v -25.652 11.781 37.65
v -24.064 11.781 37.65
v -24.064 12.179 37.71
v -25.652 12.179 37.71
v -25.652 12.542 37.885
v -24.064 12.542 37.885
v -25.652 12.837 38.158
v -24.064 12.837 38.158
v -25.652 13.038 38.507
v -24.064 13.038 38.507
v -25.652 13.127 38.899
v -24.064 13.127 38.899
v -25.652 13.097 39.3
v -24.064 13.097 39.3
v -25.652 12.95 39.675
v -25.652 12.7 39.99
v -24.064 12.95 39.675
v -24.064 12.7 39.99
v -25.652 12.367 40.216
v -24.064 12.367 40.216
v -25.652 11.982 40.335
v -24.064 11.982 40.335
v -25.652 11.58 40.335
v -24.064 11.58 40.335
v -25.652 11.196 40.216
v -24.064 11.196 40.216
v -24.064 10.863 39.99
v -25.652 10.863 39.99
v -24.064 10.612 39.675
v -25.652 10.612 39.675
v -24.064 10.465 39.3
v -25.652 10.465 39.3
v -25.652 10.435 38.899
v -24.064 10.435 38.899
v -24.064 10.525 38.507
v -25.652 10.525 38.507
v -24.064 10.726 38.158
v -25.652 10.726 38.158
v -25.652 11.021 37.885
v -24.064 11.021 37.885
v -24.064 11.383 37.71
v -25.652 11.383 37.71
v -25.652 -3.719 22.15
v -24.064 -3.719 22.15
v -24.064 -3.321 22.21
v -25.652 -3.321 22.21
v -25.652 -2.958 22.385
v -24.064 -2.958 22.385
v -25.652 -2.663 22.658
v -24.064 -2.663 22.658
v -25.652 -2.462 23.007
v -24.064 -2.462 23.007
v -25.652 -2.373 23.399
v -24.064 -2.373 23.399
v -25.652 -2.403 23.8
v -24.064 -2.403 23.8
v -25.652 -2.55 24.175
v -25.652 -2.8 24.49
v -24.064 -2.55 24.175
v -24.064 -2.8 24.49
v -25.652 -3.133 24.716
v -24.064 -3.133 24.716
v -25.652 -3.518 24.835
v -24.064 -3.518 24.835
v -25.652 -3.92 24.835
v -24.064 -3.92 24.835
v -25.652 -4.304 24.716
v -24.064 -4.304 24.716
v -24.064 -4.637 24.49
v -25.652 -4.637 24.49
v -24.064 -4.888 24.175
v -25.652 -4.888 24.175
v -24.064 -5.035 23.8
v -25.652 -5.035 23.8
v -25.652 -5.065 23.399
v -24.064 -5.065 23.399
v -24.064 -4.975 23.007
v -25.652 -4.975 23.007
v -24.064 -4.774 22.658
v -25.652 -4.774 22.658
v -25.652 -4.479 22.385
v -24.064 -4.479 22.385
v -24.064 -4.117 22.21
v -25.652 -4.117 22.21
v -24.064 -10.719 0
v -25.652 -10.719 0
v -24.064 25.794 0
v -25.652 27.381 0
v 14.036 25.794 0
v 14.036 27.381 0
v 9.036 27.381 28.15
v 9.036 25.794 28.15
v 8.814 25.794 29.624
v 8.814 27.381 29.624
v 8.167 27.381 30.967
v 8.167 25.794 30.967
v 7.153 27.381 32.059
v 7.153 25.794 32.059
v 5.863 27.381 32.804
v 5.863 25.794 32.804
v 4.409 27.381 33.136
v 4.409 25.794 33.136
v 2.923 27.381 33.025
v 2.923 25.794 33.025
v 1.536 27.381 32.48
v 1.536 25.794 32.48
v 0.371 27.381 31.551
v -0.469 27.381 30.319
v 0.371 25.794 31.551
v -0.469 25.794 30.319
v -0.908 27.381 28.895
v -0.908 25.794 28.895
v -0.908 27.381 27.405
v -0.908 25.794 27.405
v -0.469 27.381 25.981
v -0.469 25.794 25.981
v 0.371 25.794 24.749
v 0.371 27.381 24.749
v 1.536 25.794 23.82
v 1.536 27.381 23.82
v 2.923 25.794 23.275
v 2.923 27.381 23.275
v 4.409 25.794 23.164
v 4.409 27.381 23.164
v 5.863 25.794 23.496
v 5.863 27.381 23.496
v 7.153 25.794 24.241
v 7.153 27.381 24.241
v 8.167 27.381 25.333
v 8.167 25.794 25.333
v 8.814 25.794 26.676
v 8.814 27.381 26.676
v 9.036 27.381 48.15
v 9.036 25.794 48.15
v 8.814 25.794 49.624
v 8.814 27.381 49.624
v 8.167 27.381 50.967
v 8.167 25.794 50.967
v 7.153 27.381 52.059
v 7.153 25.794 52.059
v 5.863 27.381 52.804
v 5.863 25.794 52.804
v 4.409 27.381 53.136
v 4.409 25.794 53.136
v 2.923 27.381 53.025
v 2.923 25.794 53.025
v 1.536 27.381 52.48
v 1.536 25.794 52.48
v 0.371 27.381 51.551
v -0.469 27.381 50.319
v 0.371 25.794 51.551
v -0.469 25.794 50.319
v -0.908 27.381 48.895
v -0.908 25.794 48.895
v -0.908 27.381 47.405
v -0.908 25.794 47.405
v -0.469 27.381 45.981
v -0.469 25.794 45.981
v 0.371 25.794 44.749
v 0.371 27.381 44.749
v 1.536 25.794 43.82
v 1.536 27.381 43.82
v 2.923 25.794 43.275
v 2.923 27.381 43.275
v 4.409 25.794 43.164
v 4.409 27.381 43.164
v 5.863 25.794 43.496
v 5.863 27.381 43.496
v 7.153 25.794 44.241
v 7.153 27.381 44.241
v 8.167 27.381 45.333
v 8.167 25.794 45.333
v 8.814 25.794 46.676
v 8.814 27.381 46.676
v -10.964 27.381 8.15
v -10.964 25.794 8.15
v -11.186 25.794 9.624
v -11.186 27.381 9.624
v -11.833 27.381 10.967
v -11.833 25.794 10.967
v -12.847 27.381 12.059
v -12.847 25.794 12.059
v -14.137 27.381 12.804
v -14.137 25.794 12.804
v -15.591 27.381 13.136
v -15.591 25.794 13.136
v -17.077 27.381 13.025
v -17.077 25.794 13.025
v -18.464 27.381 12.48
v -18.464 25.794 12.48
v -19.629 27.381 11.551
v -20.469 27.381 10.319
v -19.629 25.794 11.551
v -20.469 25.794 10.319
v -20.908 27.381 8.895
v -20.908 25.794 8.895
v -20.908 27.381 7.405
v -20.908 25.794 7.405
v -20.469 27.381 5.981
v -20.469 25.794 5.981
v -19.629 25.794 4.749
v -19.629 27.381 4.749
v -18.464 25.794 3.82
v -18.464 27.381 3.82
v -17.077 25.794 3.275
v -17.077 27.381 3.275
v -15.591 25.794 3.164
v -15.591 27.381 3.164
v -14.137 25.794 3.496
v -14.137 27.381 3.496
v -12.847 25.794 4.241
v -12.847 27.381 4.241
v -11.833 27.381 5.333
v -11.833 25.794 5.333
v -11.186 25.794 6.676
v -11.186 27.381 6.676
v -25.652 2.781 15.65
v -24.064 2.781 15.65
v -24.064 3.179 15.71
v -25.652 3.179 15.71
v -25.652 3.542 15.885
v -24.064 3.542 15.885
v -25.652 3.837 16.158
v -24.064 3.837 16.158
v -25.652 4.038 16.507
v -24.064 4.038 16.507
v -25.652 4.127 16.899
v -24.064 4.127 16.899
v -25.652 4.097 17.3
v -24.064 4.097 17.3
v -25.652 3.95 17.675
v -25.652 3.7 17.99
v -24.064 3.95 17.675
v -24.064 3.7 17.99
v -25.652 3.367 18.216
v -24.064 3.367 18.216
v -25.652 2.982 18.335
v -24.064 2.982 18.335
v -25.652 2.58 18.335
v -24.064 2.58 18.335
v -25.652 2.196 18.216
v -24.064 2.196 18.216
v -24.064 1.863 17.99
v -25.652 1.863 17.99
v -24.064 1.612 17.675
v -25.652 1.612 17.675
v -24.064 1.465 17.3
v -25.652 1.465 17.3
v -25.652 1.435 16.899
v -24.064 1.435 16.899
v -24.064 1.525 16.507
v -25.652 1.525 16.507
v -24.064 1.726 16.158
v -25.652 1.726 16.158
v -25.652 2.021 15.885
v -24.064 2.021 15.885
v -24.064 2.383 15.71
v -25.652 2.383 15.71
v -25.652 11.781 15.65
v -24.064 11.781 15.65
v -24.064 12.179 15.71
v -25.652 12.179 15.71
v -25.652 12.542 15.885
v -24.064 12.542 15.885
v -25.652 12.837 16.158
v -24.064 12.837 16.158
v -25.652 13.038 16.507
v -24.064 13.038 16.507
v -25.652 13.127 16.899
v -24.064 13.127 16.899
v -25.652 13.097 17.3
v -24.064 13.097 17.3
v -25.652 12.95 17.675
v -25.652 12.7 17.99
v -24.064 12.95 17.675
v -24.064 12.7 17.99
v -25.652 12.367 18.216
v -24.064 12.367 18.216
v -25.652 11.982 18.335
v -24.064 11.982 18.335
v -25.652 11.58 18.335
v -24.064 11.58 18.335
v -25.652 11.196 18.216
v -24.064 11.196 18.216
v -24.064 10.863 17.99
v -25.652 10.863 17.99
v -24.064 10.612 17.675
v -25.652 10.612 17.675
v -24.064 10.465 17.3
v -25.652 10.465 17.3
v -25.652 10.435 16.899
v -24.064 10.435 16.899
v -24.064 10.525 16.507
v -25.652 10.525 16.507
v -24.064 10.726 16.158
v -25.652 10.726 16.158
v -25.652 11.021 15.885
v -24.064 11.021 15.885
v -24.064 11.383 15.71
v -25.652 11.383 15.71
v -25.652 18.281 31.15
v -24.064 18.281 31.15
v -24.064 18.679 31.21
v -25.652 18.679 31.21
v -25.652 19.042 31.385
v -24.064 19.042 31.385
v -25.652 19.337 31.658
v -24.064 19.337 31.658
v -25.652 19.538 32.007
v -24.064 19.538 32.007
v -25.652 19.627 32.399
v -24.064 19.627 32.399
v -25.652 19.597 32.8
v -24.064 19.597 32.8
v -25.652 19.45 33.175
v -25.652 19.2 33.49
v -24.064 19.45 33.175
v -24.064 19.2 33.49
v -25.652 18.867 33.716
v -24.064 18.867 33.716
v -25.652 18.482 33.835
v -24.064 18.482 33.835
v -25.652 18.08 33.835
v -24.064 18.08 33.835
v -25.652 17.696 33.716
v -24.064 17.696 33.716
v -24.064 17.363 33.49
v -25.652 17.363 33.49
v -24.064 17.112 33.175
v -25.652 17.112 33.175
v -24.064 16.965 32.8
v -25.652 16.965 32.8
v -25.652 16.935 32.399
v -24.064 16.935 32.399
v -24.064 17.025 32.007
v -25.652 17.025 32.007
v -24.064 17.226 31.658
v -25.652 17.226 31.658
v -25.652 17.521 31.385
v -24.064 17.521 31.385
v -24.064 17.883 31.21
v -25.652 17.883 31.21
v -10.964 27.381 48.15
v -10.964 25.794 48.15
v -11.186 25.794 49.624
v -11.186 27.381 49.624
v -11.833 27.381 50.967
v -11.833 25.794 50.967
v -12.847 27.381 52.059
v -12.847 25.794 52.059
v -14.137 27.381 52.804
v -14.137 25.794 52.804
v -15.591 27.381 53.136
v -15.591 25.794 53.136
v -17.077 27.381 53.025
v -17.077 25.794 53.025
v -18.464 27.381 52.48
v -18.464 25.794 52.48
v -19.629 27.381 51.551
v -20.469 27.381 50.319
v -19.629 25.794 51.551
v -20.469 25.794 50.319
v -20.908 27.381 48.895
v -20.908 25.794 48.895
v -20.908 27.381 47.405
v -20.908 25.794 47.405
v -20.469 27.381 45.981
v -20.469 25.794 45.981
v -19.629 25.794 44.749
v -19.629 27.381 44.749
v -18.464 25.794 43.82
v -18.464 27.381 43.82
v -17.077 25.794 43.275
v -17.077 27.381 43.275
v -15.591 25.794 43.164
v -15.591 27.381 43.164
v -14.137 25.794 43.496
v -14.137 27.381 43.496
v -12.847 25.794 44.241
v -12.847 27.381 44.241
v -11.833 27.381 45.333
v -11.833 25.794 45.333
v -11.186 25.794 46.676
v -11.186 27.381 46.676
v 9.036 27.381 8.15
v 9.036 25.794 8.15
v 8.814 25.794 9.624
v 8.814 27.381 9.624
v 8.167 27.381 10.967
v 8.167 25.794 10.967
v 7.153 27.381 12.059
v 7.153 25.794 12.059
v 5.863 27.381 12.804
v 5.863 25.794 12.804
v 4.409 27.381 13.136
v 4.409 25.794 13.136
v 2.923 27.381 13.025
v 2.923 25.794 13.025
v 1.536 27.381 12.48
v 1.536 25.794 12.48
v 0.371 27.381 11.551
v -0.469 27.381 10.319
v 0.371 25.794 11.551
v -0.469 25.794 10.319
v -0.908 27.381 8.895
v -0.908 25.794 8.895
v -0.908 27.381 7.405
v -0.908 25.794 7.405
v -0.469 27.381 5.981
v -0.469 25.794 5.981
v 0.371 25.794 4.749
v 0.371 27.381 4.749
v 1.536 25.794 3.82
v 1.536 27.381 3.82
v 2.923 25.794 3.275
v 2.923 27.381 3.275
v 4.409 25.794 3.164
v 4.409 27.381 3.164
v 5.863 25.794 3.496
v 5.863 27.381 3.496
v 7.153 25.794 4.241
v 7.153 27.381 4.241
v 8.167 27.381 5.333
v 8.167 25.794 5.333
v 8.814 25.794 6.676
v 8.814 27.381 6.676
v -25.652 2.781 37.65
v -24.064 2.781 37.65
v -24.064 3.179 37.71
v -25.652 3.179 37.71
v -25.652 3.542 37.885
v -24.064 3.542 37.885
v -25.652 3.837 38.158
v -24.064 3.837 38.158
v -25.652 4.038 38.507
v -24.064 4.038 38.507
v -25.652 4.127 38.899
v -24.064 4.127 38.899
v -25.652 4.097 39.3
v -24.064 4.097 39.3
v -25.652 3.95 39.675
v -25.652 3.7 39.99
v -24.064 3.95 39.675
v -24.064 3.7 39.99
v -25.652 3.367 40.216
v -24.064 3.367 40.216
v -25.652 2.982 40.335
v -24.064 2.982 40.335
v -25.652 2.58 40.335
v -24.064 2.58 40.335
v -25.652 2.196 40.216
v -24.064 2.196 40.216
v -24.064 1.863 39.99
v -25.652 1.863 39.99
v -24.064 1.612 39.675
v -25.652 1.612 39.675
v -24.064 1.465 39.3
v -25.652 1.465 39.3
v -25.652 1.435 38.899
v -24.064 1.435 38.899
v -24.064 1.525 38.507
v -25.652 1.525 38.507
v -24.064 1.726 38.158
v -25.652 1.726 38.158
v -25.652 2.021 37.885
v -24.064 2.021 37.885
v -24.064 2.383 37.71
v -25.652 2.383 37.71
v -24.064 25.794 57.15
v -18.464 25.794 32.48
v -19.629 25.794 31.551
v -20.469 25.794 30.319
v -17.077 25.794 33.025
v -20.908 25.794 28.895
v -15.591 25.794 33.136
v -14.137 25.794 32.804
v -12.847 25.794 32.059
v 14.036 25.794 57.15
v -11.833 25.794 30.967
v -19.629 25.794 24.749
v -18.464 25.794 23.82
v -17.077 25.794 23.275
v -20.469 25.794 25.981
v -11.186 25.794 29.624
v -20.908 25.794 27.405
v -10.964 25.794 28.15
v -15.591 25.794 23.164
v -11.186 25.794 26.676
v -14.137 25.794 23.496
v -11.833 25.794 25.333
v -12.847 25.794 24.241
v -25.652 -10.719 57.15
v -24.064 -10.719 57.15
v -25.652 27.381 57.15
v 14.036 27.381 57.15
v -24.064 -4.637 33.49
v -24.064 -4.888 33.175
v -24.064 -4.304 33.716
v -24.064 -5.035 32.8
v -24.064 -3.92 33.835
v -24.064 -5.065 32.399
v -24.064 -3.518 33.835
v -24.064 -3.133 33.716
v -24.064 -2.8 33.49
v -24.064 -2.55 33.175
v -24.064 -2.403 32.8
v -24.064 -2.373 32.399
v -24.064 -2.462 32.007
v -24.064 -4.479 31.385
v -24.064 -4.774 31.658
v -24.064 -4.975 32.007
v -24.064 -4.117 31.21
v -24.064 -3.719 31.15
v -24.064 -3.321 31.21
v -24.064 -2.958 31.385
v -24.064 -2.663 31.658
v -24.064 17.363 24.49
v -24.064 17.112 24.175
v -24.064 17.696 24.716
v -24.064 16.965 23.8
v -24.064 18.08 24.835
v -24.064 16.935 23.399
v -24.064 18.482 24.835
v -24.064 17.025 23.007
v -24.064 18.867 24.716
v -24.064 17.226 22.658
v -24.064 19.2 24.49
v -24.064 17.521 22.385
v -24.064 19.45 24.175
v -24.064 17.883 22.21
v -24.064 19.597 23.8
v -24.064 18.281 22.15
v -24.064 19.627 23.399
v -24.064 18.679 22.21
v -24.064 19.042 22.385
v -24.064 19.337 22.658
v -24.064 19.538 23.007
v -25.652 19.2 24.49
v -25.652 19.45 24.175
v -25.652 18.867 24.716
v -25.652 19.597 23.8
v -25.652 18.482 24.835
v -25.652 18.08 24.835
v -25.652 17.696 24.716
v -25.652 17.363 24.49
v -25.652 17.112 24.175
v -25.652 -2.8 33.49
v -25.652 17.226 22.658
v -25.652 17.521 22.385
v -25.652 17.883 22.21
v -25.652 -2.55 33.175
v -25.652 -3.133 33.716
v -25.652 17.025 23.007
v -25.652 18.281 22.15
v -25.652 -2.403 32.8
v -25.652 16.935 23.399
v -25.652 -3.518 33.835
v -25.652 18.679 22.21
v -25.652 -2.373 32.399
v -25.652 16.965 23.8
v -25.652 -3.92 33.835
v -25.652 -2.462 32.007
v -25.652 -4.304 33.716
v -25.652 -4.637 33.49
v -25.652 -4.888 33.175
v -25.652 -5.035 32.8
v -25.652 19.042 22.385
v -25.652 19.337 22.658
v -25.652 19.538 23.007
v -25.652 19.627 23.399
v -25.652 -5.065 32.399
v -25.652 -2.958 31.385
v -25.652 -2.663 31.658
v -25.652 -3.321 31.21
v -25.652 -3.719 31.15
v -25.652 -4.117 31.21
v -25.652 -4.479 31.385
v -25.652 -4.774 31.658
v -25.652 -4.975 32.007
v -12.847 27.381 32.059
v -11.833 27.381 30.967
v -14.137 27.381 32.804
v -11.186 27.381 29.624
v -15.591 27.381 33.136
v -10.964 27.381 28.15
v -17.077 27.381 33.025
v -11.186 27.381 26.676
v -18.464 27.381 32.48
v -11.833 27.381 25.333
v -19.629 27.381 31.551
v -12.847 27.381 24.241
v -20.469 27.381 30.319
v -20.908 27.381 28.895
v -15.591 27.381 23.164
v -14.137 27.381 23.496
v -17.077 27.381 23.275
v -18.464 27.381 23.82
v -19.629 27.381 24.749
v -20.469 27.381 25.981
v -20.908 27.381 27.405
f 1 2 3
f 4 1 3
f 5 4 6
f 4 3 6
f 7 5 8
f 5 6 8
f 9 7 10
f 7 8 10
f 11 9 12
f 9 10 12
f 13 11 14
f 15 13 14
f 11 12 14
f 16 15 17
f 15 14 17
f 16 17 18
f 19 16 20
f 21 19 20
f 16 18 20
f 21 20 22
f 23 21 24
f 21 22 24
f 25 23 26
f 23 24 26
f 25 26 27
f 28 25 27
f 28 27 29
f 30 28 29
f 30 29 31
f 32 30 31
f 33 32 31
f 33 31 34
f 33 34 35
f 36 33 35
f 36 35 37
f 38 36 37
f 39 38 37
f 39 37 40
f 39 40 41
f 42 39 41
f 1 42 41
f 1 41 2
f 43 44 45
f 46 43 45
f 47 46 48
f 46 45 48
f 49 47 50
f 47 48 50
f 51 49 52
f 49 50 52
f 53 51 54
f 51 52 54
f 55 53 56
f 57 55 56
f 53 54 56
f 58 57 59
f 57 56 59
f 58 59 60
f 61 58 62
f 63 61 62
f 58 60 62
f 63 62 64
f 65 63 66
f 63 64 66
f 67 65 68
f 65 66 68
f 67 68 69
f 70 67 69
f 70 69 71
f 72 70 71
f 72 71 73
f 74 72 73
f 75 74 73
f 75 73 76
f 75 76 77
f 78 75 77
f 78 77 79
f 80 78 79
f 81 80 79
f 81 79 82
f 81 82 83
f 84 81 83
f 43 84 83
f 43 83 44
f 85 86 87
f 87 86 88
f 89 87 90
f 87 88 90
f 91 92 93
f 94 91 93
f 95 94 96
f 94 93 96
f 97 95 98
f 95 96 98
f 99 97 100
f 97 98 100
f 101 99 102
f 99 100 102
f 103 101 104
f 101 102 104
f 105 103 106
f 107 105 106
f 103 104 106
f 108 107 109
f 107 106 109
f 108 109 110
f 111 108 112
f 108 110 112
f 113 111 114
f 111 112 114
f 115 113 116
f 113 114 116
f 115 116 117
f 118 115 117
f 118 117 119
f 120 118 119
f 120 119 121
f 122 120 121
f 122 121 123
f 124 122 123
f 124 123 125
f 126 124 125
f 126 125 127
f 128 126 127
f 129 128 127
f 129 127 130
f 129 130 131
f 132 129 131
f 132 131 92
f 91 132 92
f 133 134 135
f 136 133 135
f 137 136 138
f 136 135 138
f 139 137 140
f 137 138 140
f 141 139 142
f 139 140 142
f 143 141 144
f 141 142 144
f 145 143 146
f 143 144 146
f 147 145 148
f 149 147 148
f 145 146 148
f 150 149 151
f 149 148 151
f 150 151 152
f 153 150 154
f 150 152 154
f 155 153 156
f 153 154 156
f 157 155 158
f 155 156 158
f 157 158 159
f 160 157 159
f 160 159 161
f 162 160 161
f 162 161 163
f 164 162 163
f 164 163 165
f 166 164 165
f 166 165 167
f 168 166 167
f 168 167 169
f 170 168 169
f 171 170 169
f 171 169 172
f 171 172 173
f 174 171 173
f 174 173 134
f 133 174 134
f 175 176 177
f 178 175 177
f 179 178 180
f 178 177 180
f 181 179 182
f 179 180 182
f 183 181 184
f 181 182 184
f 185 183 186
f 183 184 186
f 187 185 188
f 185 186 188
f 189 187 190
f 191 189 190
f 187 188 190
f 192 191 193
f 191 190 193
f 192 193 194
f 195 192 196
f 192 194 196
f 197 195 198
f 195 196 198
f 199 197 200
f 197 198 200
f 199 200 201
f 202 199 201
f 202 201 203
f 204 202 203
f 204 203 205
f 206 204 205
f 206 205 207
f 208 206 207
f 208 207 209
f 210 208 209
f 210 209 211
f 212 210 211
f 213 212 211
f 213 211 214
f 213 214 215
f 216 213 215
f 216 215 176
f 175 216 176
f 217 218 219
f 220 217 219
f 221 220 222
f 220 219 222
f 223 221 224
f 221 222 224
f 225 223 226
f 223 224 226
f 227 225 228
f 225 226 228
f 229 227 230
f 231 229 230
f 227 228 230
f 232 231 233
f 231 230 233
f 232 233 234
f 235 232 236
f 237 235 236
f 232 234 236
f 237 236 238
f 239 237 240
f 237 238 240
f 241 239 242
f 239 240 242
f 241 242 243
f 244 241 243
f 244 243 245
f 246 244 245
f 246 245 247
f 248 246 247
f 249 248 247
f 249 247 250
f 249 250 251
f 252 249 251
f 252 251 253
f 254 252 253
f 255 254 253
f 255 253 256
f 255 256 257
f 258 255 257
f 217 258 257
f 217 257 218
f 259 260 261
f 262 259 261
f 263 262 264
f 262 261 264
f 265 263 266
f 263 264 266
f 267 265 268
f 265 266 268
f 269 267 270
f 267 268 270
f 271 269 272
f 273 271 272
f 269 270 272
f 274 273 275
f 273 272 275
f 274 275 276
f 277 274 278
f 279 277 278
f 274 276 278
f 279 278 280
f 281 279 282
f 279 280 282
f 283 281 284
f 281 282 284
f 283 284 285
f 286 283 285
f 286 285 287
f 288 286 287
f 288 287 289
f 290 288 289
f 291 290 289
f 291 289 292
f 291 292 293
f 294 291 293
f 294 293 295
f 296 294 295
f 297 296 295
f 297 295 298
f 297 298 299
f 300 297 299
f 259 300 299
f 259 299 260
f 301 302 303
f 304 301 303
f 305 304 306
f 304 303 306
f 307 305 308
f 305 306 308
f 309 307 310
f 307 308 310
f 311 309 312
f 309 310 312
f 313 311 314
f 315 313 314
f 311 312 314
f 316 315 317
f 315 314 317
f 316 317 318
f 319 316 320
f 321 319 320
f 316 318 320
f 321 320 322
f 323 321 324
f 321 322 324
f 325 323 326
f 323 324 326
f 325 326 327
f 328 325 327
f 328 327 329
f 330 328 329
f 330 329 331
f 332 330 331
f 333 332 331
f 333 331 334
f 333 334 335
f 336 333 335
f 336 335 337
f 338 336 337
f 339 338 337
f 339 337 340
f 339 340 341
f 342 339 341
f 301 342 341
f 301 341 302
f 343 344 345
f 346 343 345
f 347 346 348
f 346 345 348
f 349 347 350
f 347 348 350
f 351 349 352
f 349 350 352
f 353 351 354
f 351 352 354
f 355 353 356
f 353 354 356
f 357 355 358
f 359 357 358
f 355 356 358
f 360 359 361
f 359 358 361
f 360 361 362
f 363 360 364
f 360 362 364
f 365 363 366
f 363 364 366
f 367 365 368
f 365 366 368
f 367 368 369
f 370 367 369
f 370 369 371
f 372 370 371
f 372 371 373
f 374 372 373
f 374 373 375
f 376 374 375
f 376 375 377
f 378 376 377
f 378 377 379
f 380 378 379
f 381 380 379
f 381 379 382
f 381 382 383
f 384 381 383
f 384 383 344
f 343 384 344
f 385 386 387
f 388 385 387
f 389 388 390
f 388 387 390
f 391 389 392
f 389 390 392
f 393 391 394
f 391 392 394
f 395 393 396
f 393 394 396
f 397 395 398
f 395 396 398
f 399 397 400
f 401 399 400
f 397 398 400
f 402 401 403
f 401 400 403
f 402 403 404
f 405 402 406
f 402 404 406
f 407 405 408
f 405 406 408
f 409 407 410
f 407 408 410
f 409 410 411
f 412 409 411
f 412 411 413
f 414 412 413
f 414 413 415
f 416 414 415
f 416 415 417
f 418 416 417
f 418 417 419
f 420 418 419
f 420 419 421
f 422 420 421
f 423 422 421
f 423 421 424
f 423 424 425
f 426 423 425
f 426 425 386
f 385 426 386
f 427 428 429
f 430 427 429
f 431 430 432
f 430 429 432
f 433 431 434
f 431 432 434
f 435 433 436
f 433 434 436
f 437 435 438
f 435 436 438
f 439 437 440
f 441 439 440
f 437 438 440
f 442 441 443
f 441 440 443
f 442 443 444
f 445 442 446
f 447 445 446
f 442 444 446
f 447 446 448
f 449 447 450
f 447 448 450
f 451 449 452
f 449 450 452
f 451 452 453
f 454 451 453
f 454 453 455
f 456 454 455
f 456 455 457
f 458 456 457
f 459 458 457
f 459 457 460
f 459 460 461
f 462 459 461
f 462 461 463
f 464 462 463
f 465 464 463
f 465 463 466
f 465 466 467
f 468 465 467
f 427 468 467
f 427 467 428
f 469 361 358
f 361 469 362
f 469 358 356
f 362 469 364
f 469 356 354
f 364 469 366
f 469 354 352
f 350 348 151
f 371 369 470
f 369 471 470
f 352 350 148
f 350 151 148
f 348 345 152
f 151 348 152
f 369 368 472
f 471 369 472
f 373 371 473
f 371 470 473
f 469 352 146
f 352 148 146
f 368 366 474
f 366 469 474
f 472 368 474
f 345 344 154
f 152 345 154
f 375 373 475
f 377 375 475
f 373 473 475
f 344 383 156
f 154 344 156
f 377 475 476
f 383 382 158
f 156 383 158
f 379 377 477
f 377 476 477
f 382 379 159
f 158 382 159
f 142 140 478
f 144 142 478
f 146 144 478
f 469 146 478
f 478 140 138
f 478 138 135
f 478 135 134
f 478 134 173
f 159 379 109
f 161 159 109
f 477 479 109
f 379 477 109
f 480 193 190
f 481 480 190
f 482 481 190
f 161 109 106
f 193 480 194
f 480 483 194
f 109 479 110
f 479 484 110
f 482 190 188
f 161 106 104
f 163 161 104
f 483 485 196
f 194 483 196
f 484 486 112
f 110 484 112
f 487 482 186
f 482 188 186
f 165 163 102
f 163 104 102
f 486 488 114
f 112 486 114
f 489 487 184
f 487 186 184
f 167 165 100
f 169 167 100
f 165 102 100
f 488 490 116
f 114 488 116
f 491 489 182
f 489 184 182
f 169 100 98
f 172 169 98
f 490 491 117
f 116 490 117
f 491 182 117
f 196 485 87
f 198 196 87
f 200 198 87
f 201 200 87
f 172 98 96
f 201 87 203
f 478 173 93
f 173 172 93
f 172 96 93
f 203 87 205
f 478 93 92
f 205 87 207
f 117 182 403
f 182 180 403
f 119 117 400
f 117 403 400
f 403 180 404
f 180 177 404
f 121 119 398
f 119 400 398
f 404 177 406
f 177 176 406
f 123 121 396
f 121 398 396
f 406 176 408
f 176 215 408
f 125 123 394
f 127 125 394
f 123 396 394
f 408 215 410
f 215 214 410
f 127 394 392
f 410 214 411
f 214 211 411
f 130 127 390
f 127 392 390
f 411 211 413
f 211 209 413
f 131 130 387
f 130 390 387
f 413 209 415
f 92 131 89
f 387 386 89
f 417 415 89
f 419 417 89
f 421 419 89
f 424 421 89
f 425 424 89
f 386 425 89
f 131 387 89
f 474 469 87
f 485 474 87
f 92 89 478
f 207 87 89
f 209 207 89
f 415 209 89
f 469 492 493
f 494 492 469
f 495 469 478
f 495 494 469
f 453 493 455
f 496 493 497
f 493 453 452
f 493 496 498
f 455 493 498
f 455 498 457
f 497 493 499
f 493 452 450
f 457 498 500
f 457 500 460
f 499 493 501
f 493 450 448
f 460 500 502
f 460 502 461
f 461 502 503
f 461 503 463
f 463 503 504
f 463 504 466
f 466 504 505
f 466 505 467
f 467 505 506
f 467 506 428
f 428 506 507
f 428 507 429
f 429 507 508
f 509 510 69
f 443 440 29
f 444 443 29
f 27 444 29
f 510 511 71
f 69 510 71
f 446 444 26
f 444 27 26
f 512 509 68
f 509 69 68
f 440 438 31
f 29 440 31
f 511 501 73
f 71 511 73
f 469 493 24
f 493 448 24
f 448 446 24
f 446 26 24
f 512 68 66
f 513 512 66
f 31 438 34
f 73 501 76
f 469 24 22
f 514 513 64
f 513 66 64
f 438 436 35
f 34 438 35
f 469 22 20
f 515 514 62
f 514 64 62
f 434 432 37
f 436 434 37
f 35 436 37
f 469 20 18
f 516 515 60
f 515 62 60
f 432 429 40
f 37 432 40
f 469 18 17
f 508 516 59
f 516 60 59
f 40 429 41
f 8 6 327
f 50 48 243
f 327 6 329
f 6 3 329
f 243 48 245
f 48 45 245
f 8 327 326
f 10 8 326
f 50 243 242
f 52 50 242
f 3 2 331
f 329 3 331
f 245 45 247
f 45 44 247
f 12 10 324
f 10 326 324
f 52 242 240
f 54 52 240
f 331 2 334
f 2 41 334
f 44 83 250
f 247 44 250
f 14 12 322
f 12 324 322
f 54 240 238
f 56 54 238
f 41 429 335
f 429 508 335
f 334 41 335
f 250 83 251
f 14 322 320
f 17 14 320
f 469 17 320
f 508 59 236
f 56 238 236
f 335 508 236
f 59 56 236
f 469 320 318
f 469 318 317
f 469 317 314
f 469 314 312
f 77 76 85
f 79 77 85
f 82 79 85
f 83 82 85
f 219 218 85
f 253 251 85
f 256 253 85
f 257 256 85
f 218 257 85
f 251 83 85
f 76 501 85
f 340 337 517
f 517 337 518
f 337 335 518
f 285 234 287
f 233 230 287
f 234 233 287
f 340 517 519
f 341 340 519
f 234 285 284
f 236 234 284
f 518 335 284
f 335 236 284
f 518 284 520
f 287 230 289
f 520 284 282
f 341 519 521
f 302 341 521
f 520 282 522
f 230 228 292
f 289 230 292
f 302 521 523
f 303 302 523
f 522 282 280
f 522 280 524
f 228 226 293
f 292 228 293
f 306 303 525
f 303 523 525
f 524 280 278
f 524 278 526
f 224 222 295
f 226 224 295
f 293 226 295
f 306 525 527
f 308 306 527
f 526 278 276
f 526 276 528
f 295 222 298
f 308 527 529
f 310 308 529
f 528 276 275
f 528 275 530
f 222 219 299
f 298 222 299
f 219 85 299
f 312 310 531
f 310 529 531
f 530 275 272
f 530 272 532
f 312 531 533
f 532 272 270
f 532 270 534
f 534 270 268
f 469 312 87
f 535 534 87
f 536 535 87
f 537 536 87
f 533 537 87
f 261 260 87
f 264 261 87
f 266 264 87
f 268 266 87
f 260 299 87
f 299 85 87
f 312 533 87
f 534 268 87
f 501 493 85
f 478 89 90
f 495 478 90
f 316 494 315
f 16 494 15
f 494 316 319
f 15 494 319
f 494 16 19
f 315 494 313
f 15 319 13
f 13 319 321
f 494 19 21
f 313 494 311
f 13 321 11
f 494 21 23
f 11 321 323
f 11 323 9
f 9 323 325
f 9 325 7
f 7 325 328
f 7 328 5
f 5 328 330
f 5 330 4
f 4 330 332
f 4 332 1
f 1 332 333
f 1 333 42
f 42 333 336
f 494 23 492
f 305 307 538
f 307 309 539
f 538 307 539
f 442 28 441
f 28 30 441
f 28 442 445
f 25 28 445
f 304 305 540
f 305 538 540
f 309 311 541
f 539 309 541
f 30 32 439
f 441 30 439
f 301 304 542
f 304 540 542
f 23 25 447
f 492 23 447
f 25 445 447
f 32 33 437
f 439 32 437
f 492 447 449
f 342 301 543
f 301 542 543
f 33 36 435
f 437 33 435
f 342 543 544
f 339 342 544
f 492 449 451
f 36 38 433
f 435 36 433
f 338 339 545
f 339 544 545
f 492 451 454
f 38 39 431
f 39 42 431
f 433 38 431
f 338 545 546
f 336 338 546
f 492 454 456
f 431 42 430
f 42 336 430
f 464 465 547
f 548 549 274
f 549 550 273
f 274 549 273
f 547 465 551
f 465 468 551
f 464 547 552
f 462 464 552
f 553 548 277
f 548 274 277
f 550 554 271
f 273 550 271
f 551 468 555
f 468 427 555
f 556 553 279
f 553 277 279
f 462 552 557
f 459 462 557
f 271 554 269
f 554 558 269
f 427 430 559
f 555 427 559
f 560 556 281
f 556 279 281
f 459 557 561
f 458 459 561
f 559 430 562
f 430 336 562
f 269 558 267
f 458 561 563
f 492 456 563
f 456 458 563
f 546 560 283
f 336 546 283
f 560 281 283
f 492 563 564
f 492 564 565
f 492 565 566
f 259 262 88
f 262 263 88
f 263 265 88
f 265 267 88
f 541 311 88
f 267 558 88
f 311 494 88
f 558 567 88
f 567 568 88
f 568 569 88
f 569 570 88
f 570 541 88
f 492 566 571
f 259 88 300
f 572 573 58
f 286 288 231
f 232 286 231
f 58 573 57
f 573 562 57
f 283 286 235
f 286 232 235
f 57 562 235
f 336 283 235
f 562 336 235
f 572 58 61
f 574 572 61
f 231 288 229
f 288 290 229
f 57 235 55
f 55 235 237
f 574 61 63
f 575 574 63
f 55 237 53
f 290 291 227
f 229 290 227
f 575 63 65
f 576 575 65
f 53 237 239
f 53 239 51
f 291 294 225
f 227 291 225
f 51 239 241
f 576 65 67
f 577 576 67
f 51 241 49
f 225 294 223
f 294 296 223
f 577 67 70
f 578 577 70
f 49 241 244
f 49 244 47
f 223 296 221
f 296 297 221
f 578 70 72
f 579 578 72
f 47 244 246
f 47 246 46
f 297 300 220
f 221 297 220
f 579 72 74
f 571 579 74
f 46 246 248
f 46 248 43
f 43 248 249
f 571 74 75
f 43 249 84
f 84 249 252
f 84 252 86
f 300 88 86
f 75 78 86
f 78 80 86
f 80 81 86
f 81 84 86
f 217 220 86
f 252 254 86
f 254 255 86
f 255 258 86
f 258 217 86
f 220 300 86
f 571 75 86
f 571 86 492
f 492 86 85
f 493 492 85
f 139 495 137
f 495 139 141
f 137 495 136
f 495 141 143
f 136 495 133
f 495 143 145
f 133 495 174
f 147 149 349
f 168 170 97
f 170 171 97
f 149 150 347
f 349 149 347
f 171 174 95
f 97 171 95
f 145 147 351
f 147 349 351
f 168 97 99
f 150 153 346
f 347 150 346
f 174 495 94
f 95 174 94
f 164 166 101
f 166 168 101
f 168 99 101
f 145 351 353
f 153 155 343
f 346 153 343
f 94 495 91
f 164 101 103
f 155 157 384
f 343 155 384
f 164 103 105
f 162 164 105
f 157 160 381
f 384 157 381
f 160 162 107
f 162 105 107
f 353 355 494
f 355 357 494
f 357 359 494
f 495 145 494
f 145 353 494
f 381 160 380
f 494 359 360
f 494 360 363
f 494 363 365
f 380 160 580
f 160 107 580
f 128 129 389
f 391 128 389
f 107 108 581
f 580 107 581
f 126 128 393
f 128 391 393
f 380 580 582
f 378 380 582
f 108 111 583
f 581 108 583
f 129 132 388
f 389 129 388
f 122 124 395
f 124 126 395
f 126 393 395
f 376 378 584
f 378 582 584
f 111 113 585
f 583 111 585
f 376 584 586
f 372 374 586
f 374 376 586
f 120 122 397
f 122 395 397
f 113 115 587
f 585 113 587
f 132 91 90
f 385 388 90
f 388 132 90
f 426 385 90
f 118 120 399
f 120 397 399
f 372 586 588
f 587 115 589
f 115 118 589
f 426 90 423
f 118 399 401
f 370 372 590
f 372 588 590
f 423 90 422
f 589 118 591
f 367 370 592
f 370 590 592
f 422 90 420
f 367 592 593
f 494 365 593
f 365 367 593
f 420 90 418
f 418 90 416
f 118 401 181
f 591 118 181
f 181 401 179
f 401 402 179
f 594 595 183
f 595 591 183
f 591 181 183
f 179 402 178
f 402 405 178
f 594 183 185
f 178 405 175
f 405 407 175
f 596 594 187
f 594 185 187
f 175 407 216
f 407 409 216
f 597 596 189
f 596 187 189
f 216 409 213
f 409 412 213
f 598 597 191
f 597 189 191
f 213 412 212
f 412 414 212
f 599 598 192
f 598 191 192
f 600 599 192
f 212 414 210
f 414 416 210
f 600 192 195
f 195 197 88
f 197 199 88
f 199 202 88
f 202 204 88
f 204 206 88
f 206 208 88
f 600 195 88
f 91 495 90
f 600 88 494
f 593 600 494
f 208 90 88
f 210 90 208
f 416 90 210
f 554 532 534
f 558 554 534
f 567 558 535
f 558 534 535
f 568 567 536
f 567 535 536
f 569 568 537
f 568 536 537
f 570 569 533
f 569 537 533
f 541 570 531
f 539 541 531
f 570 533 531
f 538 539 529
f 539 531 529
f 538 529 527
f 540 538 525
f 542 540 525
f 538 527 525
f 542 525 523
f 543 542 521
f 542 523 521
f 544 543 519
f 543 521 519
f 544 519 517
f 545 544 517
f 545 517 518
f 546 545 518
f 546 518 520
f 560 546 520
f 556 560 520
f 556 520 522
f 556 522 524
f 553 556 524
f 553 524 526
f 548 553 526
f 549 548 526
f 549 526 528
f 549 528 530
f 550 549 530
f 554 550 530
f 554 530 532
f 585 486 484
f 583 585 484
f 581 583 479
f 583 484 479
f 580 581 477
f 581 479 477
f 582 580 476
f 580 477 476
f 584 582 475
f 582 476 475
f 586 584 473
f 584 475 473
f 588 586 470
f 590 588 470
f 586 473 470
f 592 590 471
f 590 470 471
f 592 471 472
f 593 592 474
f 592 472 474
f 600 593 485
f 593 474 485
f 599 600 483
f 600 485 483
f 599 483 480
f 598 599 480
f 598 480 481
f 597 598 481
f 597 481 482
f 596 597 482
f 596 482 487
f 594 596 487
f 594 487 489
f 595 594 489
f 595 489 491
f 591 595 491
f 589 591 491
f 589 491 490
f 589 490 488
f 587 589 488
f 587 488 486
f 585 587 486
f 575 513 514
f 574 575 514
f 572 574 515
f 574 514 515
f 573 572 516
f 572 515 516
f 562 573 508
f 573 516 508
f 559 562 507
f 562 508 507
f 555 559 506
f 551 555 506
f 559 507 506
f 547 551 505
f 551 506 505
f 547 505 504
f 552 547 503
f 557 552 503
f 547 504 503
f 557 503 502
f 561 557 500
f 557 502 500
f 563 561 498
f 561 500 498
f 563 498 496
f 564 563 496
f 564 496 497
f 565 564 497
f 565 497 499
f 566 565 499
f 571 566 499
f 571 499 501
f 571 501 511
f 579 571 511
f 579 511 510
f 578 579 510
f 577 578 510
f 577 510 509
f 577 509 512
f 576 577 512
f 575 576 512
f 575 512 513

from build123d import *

# Parameters (mm, degrees)
BOSS_EXTRUDE1_DEPTH = 57.15
SKETCH3_R           = 1.35
CUT_EXTRUDE1_DEPTH  = 2.5875
SKETCH2_R           = 5
CUT_EXTRUDE2_DEPTH  = 2.5875


with BuildPart() as part:
    # Sketch1 → Boss-Extrude1 (new body)
    with BuildSketch(Plane.XY):
        Polygon((-25.651653512, -10.718726646), (-24.064153512, -10.718726646), (-24.064153512, 25.793773354), (14.035846488, 25.793773354), (14.035846488, 27.381273354), (-24.064153512, 27.381273354), (-25.651653512, 27.381273354), align=None)
    extrude(amount=BOSS_EXTRUDE1_DEPTH)

    # Sketch3 → Cut-Extrude1 (cut, through all)
    with BuildSketch(Plane(origin=(-24.064153512, 0, 0), x_dir=(0, 0, -1), z_dir=(1, 0, 0))):
        with Locations((-32.5, 18.281273354)):
            Circle(SKETCH3_R)
        with Locations((-23.5, 18.281273354)):
            Circle(SKETCH3_R)
        with Locations((-17, 11.781273354)):
            Circle(SKETCH3_R)
        with Locations((-17, 2.781273354)):
            Circle(SKETCH3_R)
        with Locations((-23.5, -3.718726646)):
            Circle(SKETCH3_R)
        with Locations((-32.5, -3.718726646)):
            Circle(SKETCH3_R)
        with Locations((-39, 2.781273354)):
            Circle(SKETCH3_R)
        with Locations((-39, 11.781273354)):
            Circle(SKETCH3_R)
    extrude(amount=-CUT_EXTRUDE1_DEPTH, mode=Mode.SUBTRACT)

    # Sketch2 → Cut-Extrude2 (cut, through all)
    with BuildSketch(Plane.XZ.offset(-25.793773354)):
        with Locations((4.035846488, 48.15)):
            Circle(SKETCH2_R)
        with Locations((4.035846488, 28.15)):
            Circle(SKETCH2_R)
        with Locations((4.035846488, 8.15)):
            Circle(SKETCH2_R)
        with Locations((-15.964153512, 48.15)):
            Circle(SKETCH2_R)
        with Locations((-15.964153512, 28.15)):
            Circle(SKETCH2_R)
        with Locations((-15.964153512, 8.15)):
            Circle(SKETCH2_R)
    extrude(amount=-CUT_EXTRUDE2_DEPTH, mode=Mode.SUBTRACT)


solid = part.part
